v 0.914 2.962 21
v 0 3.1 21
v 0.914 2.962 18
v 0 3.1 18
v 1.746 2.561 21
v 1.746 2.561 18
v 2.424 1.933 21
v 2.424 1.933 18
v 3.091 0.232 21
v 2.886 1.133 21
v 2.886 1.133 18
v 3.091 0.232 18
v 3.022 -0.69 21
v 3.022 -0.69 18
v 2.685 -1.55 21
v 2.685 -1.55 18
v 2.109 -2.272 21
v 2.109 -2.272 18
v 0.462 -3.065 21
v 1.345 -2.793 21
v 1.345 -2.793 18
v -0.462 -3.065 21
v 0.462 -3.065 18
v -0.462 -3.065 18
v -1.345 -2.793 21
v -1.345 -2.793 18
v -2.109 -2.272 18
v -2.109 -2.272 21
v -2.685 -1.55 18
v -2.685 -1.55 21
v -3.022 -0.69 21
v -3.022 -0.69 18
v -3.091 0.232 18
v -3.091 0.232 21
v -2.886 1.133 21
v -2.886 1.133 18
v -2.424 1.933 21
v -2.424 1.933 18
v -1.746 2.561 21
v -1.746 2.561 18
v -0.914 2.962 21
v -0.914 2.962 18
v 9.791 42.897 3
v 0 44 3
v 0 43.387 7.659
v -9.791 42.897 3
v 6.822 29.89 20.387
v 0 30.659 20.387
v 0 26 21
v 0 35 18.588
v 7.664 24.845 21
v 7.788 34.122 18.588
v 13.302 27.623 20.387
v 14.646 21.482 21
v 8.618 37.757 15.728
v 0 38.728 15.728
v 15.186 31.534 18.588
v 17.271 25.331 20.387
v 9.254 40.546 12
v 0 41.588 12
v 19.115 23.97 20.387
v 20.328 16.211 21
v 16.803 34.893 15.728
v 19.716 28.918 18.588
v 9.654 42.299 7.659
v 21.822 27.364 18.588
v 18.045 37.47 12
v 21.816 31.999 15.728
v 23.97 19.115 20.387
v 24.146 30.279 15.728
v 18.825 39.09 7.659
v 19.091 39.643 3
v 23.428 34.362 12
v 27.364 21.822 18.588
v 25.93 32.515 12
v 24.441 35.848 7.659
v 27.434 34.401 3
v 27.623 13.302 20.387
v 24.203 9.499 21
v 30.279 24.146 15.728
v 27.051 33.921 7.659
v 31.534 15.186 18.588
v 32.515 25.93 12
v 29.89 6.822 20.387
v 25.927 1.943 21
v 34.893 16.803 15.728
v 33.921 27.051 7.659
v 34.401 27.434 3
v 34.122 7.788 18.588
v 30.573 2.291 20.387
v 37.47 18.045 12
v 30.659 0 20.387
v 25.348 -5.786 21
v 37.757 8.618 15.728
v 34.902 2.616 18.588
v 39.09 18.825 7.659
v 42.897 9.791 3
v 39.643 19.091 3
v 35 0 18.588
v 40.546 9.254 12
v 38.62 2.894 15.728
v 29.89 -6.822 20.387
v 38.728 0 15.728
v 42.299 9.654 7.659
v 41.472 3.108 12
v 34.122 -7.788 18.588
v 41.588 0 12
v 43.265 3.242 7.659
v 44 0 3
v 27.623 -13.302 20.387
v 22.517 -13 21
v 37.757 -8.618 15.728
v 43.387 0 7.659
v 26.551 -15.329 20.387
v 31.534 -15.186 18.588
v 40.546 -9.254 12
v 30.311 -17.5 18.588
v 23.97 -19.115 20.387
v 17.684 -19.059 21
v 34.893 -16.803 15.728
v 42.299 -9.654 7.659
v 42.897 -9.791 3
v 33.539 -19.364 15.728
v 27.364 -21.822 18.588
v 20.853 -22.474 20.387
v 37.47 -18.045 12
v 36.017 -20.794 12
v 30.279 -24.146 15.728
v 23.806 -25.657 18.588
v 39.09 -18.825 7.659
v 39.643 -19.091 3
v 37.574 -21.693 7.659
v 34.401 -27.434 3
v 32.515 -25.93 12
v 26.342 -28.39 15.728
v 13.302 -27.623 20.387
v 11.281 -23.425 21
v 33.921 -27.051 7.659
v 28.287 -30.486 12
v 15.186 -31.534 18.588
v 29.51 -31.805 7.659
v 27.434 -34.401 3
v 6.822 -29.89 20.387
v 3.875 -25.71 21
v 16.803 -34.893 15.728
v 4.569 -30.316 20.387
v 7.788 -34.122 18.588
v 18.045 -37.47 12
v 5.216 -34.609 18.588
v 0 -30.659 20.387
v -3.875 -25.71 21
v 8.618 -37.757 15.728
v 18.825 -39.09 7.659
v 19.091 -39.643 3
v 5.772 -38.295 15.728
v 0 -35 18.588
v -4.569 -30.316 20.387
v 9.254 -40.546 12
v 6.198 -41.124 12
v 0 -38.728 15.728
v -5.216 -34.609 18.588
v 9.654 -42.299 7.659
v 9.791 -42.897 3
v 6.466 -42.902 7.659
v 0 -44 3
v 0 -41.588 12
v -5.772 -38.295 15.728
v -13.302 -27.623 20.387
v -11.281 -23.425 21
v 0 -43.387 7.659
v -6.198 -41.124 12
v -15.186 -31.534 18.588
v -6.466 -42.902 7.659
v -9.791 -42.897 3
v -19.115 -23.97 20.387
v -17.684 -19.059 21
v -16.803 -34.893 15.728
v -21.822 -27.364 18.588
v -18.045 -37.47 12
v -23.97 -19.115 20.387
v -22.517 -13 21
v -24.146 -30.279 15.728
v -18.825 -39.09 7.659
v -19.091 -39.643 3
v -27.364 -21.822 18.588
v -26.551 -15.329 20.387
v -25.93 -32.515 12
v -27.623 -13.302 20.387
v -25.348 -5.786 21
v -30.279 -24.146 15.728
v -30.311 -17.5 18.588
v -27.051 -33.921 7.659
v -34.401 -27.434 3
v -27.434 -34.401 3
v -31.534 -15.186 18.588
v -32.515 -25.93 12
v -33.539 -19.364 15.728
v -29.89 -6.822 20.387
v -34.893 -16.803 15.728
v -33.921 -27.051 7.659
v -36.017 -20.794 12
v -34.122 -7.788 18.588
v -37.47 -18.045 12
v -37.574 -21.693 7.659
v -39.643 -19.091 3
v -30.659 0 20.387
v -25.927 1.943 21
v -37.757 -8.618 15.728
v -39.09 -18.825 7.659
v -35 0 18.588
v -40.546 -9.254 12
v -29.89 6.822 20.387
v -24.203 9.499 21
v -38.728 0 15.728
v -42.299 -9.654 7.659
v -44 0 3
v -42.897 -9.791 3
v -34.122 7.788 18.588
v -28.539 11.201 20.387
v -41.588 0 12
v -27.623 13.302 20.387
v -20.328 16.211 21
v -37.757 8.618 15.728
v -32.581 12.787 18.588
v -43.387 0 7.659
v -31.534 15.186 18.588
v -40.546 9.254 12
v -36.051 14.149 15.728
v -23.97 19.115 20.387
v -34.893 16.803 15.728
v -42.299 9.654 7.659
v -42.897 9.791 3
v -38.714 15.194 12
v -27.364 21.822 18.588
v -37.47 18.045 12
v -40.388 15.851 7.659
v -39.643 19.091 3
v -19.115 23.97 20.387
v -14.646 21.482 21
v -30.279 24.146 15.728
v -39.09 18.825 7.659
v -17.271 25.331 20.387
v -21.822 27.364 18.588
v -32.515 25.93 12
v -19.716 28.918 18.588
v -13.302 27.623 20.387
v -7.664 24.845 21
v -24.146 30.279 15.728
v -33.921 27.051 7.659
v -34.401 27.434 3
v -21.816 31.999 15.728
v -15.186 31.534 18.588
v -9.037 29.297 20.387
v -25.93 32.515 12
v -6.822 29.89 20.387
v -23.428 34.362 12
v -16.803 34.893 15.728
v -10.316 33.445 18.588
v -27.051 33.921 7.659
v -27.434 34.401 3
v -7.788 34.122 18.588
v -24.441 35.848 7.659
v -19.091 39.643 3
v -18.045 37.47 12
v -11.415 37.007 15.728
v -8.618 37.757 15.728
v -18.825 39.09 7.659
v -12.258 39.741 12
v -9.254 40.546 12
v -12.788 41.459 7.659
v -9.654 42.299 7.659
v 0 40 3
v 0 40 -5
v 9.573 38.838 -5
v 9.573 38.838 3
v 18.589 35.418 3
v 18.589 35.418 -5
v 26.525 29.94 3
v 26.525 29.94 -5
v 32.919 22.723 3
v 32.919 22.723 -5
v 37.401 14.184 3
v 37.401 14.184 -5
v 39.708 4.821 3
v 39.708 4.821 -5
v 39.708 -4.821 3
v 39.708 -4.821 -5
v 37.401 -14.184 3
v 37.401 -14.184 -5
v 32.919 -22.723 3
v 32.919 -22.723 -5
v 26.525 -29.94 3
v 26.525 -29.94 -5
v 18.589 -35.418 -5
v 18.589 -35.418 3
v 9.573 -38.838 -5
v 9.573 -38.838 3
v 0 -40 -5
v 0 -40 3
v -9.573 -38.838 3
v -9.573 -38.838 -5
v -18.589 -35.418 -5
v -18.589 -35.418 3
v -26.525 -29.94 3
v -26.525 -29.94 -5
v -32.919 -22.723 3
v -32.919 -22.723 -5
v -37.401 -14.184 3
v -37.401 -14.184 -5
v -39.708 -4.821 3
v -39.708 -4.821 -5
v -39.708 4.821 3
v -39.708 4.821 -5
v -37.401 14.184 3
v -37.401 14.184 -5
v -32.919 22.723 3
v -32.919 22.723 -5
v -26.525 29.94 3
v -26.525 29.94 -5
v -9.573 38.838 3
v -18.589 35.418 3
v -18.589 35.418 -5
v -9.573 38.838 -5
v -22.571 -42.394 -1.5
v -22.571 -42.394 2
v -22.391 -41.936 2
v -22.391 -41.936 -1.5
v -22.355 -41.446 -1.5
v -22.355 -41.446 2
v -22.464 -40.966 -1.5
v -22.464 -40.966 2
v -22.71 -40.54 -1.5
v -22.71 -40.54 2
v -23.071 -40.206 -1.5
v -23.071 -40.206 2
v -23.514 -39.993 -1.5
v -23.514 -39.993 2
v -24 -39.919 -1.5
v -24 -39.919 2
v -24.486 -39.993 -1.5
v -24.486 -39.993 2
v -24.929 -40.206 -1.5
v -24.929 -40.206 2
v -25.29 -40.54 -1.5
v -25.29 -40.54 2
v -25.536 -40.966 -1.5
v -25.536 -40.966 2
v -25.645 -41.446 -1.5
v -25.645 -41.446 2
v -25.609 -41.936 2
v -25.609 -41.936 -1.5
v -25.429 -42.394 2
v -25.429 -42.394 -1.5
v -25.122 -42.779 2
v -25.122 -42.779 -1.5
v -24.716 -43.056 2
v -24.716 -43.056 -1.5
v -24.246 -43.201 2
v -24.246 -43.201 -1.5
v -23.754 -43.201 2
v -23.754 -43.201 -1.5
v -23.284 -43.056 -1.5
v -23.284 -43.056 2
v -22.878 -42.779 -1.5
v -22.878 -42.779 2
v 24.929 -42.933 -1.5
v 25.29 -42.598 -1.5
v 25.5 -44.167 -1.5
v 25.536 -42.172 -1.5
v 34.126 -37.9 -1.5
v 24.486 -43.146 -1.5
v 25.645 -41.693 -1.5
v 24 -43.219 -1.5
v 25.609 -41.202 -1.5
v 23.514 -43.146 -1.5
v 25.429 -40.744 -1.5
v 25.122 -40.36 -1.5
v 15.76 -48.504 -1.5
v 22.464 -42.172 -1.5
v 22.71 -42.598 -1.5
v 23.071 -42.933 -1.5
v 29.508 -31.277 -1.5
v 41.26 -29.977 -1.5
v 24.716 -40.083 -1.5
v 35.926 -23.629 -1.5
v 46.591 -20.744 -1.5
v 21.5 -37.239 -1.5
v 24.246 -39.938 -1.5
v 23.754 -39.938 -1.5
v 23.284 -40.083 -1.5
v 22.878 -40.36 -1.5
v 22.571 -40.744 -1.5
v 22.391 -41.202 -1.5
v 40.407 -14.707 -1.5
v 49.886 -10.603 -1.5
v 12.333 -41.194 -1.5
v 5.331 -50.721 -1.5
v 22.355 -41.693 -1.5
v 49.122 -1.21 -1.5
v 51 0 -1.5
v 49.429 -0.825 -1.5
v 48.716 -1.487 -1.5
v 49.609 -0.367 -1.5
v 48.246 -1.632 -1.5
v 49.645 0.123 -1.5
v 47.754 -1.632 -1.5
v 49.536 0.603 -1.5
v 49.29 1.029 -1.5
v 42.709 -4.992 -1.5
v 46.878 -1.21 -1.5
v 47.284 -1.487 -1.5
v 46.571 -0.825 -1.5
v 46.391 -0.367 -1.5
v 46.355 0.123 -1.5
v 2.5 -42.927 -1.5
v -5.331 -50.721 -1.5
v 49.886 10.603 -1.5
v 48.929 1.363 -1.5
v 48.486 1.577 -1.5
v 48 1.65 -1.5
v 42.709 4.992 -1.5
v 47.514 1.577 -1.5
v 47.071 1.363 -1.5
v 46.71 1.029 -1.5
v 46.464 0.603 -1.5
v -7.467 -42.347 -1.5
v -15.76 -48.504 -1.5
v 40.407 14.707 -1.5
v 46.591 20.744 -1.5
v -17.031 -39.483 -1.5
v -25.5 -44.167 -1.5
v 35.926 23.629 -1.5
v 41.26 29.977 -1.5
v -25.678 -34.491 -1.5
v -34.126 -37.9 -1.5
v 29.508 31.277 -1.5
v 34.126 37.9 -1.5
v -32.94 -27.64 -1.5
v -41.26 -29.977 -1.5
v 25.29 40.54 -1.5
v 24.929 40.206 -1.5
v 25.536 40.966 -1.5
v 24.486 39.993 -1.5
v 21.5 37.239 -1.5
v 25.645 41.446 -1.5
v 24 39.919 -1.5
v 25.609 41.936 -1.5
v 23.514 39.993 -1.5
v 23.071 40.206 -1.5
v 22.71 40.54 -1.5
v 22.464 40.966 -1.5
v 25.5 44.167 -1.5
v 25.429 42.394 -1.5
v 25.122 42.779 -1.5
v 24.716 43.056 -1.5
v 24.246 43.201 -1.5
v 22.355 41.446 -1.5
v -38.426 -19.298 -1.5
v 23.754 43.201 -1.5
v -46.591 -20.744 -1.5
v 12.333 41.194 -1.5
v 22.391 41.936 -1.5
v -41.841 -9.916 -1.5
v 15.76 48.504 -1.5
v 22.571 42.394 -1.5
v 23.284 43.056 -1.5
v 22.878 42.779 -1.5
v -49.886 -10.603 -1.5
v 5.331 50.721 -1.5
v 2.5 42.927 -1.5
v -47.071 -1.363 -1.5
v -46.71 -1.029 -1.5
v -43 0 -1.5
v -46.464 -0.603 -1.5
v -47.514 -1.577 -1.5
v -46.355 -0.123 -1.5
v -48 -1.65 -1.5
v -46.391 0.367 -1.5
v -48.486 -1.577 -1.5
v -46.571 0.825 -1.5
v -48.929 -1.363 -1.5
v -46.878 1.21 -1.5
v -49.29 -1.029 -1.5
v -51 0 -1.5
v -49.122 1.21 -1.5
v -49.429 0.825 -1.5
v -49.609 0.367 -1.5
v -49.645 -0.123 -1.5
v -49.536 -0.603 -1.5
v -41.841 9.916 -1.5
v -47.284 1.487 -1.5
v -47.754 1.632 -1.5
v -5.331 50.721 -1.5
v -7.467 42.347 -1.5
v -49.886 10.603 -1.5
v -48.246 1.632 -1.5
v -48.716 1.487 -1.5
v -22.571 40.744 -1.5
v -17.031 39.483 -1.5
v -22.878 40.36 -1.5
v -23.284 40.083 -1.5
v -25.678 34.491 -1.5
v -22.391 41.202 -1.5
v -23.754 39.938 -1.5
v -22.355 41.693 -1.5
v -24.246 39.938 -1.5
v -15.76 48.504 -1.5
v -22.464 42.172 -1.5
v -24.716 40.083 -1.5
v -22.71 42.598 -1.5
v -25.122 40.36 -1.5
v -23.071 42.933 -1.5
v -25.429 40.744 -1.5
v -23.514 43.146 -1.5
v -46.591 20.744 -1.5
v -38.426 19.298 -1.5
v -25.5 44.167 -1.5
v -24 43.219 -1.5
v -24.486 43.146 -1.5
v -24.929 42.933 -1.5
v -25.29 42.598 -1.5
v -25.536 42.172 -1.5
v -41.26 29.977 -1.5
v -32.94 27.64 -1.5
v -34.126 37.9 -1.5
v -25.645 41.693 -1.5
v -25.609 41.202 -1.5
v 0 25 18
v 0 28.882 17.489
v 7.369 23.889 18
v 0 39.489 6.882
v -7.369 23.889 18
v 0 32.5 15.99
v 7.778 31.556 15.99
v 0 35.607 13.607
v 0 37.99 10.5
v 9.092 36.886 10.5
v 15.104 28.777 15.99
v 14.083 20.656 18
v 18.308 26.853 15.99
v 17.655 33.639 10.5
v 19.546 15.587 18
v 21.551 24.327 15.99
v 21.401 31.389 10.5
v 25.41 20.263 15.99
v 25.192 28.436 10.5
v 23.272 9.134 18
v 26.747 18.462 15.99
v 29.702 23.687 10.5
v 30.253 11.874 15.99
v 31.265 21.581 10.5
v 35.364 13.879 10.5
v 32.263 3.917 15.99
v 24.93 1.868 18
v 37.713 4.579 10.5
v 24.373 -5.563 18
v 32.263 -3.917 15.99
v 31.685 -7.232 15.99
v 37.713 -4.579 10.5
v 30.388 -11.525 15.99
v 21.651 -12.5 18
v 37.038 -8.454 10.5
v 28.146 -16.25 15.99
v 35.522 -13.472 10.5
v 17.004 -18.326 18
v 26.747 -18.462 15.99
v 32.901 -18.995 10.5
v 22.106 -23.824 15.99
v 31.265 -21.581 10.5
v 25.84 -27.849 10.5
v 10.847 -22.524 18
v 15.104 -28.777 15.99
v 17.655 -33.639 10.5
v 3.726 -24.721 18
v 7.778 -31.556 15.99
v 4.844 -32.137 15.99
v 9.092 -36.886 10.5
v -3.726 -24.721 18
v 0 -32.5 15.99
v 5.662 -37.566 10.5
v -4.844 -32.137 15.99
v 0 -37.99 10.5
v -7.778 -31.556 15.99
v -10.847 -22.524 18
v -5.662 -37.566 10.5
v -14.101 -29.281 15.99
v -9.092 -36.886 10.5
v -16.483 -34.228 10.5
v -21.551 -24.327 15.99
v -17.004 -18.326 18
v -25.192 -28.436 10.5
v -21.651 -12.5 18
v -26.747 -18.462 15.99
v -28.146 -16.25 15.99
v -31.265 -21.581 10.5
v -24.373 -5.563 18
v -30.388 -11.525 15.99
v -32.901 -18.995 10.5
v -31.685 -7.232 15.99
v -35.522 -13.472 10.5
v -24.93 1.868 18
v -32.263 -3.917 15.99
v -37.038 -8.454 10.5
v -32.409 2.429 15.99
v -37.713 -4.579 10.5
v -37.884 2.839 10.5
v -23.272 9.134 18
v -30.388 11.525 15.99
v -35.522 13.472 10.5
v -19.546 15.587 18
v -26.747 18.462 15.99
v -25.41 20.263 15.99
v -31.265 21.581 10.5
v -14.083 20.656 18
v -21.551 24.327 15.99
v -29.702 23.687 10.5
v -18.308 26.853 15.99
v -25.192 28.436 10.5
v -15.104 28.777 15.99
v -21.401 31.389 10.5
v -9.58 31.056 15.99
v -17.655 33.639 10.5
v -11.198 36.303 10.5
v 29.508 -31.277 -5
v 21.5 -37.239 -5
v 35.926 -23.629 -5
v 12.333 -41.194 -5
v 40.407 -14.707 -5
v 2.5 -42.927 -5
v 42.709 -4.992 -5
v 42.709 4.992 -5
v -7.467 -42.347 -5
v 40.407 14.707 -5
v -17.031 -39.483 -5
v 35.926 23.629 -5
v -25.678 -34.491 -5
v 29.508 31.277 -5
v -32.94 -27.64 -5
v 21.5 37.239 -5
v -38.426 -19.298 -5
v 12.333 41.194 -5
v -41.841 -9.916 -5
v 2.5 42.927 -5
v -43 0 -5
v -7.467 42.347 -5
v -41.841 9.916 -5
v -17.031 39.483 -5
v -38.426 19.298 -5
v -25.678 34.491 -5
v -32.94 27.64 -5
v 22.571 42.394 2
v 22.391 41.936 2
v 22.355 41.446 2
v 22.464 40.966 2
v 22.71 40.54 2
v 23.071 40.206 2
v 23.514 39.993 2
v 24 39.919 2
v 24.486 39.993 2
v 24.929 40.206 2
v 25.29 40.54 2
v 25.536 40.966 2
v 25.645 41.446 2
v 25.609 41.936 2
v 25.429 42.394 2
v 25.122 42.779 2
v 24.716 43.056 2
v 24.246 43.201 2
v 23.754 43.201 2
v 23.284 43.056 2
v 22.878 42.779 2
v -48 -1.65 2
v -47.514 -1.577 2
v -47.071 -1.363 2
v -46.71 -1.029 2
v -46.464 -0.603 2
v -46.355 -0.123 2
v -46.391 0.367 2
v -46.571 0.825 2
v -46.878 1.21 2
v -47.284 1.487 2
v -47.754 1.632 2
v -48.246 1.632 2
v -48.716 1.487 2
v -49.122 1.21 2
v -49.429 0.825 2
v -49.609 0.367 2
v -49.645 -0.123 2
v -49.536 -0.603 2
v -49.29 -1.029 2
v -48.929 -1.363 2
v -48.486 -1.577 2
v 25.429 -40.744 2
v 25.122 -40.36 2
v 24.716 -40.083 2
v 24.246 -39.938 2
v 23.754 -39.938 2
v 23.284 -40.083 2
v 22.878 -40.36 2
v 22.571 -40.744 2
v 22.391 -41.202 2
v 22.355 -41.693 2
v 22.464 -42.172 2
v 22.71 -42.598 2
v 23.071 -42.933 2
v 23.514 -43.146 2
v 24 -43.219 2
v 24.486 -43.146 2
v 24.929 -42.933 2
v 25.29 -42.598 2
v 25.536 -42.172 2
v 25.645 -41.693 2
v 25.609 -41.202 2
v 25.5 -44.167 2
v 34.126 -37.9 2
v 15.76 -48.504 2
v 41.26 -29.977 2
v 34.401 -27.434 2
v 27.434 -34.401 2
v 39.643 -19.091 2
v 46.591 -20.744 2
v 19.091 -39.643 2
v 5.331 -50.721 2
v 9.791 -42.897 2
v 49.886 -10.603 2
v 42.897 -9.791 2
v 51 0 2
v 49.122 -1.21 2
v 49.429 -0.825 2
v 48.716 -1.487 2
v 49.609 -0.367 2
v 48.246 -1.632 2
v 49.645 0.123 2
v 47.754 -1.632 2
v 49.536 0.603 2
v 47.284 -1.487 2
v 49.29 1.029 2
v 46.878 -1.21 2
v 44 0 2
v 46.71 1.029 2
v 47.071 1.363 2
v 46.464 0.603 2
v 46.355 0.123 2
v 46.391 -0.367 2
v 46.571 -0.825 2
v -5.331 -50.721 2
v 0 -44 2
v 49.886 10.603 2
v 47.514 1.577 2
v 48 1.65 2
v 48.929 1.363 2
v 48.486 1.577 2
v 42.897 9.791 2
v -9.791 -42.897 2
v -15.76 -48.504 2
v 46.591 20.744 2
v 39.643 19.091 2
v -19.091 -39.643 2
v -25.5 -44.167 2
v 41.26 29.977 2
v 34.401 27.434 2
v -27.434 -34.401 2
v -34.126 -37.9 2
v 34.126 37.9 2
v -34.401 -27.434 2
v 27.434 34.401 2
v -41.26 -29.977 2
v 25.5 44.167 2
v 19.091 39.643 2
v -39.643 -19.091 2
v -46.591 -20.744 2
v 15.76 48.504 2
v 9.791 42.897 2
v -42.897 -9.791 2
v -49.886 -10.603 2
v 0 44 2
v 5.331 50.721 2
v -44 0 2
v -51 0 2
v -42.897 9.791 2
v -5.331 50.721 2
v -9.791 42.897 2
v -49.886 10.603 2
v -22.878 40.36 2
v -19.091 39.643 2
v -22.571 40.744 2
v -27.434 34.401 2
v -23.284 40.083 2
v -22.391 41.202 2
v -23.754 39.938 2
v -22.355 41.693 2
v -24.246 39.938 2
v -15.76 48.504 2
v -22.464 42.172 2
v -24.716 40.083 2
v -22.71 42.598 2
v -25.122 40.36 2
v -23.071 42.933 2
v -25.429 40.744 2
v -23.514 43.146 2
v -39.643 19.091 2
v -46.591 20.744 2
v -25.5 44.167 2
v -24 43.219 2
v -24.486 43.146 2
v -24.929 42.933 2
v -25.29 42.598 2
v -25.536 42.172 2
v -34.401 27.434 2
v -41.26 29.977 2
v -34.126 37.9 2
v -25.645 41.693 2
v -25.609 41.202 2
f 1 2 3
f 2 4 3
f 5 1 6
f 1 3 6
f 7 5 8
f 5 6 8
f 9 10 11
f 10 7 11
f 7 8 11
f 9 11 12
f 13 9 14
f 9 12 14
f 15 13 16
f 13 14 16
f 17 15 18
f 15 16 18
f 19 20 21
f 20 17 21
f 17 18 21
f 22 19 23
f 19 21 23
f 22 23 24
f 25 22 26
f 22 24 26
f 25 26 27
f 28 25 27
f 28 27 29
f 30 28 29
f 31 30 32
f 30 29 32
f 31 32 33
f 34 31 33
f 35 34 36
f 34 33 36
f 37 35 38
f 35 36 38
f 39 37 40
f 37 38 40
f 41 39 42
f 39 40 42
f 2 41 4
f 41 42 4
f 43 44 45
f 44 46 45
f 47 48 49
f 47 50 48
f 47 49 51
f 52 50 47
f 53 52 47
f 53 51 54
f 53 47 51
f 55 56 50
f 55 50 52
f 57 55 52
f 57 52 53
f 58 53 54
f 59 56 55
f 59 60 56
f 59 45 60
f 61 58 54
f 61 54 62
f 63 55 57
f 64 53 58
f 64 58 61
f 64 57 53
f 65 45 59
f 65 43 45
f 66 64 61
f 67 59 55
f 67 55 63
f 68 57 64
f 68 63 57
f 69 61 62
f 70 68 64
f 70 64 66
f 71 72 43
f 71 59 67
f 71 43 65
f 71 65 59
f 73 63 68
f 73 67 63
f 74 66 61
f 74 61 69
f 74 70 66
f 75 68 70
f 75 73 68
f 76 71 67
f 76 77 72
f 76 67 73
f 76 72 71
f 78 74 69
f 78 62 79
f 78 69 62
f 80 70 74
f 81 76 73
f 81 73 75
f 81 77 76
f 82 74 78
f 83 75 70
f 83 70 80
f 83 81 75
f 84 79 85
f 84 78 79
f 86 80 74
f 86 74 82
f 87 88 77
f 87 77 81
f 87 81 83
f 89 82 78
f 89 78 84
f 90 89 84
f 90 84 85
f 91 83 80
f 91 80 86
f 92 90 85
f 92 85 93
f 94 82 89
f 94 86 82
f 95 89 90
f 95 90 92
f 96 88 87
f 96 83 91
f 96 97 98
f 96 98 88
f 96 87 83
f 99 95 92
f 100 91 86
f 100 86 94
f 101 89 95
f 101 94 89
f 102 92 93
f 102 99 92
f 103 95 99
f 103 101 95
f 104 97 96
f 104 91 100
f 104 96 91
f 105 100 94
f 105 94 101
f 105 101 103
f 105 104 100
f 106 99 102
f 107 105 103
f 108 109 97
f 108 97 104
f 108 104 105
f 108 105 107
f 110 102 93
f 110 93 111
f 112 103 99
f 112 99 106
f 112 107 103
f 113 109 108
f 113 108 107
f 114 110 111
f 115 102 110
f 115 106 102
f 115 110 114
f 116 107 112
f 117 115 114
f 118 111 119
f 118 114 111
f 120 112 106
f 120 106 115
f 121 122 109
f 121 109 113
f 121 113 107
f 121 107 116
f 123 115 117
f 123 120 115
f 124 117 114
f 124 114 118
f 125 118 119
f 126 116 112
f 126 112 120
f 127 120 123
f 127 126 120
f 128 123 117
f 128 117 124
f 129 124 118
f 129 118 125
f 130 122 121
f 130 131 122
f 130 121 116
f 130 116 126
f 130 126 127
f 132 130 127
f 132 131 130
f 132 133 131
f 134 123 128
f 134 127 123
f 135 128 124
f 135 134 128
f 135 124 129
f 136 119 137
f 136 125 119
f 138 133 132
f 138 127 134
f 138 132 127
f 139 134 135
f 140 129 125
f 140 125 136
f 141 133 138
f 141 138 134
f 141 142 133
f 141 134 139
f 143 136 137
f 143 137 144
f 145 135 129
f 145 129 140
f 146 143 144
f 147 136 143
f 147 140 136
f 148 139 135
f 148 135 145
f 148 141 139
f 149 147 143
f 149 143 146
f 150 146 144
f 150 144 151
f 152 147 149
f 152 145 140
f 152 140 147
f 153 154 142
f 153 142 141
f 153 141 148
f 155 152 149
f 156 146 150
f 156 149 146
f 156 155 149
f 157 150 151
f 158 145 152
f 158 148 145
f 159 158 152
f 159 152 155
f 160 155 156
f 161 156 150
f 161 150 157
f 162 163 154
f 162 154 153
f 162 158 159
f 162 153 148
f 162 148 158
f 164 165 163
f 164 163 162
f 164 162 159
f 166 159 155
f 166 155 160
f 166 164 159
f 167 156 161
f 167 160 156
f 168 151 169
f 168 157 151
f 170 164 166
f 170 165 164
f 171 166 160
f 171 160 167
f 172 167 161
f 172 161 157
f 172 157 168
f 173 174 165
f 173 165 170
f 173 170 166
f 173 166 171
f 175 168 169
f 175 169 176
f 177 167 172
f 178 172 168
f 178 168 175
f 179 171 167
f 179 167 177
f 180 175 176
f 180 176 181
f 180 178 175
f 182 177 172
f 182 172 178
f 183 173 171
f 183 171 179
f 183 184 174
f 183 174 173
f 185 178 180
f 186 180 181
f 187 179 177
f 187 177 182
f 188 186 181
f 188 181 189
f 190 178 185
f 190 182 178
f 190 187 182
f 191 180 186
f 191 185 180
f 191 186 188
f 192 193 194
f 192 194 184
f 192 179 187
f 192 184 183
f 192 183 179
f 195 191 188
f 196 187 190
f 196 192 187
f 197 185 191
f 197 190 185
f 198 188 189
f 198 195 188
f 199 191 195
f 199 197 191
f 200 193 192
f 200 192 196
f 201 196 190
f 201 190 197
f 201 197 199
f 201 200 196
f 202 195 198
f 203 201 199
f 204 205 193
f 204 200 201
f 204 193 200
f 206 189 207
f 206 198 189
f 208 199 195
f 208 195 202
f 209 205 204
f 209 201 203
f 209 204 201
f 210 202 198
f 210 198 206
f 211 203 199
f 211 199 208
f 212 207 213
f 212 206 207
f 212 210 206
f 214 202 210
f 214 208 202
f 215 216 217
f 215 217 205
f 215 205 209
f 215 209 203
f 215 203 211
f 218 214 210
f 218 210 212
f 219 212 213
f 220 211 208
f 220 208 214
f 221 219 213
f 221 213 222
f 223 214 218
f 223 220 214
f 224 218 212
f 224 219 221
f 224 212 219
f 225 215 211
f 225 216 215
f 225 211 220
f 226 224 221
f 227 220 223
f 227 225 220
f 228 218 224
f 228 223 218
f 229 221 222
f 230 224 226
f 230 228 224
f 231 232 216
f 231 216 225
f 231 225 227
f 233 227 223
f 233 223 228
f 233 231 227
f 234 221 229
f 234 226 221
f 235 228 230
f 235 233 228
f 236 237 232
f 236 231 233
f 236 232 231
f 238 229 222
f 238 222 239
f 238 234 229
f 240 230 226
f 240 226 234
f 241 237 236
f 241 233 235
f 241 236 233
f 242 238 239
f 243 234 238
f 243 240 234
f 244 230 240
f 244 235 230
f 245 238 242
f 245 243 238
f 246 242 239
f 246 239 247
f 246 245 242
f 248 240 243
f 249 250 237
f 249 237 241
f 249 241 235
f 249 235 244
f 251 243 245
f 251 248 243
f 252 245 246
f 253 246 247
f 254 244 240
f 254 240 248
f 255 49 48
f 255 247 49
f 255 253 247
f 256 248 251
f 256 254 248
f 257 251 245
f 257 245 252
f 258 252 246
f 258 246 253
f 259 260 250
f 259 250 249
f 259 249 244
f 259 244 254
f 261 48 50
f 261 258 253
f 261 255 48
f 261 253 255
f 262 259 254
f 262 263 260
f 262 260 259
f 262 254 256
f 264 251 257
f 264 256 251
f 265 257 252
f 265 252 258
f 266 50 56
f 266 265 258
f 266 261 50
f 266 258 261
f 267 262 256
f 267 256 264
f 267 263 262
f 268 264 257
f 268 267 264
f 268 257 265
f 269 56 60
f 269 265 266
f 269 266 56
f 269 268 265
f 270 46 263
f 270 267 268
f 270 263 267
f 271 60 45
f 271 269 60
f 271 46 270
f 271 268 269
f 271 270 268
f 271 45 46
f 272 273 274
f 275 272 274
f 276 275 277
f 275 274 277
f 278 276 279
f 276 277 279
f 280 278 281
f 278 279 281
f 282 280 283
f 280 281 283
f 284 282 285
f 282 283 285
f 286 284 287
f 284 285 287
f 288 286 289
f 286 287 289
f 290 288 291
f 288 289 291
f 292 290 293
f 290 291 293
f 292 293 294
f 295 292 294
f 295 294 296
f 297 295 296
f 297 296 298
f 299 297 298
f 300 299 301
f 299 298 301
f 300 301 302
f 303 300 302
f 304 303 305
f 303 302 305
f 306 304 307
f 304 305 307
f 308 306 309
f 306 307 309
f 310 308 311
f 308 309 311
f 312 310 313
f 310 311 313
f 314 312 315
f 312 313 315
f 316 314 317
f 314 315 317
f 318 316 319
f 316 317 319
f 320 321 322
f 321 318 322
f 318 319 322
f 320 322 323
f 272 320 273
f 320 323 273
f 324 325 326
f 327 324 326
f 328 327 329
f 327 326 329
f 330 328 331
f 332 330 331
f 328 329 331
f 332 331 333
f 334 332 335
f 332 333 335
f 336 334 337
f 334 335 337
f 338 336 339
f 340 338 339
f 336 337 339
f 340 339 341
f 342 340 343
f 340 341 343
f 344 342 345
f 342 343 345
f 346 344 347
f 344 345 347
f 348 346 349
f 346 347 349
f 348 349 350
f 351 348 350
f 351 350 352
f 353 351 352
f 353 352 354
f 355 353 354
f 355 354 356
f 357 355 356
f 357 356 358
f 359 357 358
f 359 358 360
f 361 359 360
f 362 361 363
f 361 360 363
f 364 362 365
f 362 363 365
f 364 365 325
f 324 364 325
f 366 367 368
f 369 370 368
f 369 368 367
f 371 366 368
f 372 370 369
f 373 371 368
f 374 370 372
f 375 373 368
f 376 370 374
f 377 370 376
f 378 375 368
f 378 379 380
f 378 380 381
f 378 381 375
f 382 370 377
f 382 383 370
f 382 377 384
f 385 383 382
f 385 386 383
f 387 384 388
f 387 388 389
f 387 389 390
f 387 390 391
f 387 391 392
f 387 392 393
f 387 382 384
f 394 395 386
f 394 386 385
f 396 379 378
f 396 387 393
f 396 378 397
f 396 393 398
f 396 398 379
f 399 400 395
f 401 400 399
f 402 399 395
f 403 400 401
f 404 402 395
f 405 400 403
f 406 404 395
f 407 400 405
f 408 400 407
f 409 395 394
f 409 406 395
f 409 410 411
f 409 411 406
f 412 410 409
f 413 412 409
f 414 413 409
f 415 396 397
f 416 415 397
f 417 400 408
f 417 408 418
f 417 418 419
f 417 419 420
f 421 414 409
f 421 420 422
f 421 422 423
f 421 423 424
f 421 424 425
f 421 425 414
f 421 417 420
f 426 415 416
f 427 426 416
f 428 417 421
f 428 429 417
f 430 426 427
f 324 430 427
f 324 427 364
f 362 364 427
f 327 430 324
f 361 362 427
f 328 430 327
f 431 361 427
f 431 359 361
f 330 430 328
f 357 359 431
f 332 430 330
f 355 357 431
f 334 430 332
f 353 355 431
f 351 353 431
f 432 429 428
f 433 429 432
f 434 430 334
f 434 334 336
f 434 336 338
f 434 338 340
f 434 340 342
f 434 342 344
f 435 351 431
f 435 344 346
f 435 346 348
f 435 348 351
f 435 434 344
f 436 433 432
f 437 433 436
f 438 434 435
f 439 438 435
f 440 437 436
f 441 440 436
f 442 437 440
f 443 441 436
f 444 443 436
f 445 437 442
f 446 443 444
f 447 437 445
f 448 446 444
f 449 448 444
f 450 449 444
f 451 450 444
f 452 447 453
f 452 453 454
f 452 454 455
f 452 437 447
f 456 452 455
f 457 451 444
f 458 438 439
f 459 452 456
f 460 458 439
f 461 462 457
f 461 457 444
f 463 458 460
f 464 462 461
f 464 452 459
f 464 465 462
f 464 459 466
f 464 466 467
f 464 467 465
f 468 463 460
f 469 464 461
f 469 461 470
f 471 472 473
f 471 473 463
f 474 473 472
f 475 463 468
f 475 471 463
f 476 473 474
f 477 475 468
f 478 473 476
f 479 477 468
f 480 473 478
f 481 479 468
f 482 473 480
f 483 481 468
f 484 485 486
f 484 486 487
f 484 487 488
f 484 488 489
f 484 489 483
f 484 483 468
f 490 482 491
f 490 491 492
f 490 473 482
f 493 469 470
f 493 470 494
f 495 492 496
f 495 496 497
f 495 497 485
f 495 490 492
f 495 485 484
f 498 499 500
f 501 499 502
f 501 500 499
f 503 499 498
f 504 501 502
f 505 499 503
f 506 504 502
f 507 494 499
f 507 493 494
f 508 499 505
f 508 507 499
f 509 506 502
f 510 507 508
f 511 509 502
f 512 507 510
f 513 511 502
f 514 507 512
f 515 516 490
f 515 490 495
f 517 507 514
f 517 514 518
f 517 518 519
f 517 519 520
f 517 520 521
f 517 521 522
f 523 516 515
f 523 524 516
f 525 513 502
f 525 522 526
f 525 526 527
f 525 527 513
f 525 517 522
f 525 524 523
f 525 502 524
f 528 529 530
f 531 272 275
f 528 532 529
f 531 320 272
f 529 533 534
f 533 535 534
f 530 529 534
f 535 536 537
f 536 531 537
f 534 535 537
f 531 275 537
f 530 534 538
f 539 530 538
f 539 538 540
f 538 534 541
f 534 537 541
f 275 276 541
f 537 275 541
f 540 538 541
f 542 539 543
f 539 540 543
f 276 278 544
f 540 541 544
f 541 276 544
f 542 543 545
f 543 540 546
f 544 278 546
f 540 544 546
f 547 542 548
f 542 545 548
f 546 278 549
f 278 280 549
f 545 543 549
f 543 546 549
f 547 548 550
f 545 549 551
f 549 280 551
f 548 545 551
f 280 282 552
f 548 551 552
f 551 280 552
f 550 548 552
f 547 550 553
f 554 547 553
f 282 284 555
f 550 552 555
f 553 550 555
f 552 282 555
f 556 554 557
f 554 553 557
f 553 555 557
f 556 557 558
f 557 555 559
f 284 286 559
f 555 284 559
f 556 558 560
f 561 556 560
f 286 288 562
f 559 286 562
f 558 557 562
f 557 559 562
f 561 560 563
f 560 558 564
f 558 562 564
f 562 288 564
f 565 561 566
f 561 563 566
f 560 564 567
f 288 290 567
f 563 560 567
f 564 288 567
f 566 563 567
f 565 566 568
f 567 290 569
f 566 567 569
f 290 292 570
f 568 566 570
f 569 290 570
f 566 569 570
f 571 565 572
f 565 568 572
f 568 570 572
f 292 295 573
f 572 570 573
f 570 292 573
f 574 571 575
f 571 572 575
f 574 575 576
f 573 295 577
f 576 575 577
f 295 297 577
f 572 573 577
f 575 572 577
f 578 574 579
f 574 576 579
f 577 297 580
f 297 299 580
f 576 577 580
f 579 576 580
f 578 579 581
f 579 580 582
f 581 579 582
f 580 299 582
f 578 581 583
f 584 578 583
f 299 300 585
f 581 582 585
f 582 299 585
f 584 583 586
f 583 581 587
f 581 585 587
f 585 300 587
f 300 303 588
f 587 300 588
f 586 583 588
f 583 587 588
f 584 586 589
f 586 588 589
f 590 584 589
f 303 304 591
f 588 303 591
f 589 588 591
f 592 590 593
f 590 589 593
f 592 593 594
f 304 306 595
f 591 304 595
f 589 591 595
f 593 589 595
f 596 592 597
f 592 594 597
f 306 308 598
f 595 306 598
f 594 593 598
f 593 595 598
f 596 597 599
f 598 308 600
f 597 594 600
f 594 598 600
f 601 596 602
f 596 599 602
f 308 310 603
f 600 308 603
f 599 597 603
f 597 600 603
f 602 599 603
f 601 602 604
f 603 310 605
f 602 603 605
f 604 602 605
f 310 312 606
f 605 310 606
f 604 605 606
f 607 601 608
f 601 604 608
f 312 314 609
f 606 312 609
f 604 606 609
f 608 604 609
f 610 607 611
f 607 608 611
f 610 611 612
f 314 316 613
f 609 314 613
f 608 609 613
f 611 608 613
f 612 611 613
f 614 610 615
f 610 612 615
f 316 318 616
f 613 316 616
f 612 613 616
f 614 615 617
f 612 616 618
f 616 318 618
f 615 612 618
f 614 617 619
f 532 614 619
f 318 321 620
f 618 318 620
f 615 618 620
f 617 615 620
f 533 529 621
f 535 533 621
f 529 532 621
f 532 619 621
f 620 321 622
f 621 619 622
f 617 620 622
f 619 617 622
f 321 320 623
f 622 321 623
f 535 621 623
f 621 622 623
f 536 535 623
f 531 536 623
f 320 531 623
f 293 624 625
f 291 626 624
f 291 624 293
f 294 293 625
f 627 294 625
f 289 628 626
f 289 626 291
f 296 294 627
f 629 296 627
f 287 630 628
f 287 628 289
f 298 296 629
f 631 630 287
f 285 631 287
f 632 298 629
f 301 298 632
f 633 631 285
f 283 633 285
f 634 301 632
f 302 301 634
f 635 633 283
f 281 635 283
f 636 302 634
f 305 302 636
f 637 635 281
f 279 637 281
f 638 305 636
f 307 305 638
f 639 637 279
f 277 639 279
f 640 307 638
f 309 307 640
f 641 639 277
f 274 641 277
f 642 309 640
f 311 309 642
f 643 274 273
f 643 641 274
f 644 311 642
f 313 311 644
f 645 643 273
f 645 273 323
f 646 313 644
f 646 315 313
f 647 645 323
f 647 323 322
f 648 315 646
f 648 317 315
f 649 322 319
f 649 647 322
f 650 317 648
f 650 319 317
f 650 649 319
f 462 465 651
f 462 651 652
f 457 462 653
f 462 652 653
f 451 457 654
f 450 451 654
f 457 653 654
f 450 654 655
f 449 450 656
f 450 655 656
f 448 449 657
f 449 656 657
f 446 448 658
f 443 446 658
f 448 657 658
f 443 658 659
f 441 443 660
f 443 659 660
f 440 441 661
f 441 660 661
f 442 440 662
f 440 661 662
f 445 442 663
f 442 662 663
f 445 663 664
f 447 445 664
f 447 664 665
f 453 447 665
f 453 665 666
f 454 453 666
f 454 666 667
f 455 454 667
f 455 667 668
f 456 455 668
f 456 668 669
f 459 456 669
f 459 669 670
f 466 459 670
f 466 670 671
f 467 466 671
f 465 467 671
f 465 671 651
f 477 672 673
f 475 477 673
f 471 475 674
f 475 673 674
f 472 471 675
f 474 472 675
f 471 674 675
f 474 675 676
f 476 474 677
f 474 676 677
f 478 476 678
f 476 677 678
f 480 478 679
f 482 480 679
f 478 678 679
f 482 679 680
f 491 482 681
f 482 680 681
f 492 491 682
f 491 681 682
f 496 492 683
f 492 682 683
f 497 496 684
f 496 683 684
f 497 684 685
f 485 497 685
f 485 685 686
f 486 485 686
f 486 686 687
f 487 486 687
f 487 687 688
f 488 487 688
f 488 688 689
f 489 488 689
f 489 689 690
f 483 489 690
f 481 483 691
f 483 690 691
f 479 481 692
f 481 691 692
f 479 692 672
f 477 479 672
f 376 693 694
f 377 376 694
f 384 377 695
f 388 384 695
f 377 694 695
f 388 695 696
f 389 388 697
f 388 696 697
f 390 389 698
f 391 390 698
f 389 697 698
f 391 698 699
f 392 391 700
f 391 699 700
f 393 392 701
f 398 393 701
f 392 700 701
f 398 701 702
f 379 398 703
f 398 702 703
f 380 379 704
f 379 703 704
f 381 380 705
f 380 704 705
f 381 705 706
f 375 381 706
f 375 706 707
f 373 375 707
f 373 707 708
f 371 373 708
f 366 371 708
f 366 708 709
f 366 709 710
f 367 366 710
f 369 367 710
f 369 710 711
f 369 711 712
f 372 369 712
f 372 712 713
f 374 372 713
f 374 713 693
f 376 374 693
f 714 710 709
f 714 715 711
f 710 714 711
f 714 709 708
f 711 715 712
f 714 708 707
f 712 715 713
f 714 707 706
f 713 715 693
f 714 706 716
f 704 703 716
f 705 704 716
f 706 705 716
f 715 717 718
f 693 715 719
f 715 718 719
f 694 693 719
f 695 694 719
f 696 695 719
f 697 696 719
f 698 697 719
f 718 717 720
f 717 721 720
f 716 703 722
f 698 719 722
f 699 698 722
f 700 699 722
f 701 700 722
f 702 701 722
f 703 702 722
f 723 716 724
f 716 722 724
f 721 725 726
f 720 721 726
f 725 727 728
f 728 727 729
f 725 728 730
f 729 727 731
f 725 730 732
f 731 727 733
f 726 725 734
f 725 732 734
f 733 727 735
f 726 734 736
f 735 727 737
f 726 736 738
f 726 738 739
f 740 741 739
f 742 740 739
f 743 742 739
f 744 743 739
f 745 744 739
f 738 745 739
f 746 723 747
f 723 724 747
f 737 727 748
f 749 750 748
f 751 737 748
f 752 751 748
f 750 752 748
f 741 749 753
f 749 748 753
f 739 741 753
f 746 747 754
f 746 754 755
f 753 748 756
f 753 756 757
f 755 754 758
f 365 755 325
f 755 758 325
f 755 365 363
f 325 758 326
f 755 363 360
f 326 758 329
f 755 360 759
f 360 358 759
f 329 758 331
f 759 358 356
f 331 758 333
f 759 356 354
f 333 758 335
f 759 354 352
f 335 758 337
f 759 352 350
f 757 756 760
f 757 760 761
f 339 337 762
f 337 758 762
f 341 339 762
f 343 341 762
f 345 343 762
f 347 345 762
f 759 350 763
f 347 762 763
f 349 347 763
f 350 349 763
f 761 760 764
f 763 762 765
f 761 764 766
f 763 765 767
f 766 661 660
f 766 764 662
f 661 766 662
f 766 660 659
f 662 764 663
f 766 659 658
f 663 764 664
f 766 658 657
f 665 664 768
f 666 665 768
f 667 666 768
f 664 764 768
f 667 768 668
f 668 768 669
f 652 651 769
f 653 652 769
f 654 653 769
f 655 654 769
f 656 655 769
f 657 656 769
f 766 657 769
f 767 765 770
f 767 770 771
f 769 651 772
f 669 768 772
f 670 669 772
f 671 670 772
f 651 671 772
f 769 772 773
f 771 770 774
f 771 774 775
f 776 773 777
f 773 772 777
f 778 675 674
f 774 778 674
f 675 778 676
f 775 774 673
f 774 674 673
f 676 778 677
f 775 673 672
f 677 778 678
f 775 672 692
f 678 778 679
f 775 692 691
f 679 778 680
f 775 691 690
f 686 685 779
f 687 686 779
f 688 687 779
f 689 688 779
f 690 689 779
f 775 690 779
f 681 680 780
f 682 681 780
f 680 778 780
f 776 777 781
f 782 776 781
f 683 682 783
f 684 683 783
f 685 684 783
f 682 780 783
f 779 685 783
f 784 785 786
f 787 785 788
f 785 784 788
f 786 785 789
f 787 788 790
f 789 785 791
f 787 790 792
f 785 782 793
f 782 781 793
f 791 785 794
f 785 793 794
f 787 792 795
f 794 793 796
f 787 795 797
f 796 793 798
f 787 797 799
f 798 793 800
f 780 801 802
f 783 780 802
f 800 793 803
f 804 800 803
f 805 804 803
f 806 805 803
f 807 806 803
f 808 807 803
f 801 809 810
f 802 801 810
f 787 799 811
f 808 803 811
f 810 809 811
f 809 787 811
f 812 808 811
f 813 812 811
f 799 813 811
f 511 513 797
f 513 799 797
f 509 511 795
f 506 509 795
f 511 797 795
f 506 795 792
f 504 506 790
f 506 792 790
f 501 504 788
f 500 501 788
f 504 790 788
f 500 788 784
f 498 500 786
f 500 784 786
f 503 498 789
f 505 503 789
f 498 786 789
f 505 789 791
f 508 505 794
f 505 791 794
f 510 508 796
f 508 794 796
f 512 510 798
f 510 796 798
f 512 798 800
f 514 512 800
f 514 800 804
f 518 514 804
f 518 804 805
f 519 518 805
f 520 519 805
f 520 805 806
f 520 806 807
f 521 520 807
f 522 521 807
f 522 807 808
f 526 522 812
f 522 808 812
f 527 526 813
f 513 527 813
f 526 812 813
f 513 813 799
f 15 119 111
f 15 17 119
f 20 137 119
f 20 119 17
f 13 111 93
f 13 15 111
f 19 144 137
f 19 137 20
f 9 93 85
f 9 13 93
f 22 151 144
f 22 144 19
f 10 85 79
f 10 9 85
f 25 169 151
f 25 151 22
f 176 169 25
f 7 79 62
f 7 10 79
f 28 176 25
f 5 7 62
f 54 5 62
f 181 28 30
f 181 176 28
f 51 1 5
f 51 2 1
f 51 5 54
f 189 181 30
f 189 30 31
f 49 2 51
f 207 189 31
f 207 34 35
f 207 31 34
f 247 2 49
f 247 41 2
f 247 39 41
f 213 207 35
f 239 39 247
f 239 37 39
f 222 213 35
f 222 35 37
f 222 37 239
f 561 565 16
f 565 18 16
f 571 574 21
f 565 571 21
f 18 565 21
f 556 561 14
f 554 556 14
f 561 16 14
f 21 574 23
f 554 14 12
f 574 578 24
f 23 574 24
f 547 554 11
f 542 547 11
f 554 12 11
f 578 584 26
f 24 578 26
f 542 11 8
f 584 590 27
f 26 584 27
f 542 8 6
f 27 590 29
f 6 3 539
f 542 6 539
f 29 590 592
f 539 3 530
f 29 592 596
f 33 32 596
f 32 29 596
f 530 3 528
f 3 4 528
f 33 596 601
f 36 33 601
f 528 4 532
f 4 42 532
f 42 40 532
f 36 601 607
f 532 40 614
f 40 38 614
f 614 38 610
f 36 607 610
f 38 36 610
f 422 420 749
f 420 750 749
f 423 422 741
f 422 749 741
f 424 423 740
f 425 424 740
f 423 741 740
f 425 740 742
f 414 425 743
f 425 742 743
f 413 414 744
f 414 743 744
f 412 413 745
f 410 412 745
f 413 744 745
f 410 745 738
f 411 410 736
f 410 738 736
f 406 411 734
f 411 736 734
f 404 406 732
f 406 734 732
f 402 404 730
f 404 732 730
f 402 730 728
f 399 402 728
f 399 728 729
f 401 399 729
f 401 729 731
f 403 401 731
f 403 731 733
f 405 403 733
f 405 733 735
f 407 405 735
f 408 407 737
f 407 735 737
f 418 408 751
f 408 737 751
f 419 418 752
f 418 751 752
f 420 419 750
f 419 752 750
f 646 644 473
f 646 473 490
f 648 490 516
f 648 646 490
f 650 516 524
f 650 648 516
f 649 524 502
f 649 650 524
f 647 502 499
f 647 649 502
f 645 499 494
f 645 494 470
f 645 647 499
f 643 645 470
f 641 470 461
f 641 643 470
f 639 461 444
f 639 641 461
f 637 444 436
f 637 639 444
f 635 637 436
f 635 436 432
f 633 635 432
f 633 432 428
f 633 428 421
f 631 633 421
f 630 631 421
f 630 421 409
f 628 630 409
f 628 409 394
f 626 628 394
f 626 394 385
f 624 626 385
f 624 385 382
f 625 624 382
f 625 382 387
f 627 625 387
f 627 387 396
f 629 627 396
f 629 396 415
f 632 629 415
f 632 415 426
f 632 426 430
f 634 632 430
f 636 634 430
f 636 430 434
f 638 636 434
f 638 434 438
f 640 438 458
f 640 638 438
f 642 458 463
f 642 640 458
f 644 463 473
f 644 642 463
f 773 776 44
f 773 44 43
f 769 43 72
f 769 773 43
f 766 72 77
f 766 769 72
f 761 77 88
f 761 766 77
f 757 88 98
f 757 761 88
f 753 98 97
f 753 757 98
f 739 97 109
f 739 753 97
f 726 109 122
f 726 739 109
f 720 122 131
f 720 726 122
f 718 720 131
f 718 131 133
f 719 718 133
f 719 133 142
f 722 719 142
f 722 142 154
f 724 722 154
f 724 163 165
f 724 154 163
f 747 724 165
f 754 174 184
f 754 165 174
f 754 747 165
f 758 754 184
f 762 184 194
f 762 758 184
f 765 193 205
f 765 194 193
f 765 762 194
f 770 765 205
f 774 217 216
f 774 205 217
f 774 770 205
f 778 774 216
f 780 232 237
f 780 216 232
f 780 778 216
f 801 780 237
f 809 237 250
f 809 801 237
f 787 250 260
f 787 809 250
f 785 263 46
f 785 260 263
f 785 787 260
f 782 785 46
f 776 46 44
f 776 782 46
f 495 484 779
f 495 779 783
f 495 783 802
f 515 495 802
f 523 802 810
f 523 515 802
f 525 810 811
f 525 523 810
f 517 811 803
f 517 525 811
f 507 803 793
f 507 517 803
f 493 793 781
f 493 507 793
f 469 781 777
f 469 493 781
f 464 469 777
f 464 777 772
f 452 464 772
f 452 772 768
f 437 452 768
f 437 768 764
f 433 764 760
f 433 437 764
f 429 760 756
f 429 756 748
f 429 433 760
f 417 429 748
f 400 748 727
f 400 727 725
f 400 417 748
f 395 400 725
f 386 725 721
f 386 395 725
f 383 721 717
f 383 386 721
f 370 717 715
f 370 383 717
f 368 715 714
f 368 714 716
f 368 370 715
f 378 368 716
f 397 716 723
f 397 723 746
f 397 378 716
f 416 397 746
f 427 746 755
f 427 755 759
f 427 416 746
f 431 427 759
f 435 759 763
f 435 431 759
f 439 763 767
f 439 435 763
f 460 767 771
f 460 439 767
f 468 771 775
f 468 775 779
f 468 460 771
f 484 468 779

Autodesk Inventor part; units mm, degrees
ref_plane "YZ Plane" through (0, 0, 0) normal (1, 0, 0) x (0, 1, 0)
ref_plane "XZ Plane" through (0, 0, 0) normal (0, 1, 0) x (-1, 0, 0)
sketch "Skizze1" plane through (0, 0, 0) normal (1, 0, 0) x (0, 1, 0)
  line L0 (0, 0) -> (0, 55)
  line L1 (44, 0) -> (0, 0) construction
  line L2 (3.1, 21) -> (3.1, 18)
  line L3 (44, 0) -> (40, 0)
  line L4 (40, 0) -> (40, -5)
  line L5 (40, -5) -> (44, -5)
  line L6 (44, -5) -> (44, 0)
  line L7 (3.1, 18) -> (40, 18)
  line L8 (40, 18) -> (40, 0)
  line L9 (3.1, 21) -> (44, 21)
  line L10 (44, 21) -> (44, 0)
  point P0 (21.7075, 15.1998)
  dimension "d143" = 6.2
  dimension "d146" = 18
  dimension "d147" = 3
  dimension "d155" = 5
  dimension "d156" = 4
  dimension "d186" = 80
revolve "Umdrehung4" add sketch "Skizze1" angle 360 about axis through (0, 0, 0) along (0, 0, 1)
sketch "Skizze28" plane through (0, 0, -5) normal (0, 0, -1) x (-1, 0, 0)
  circle A0 centre (0, 0) radius 44 projected
  circle A1 centre (0, 0) radius 40 projected
  circle A2 centre (0, 0) radius 51
  dimension "d157" = 102
extrude "Extrusion10" add sketch "Skizze28" against normal blind 7 contours A0 | A2
sketch "Skizze29" plane through (0, 0, -5) normal (0, 0, -1) x (-1, 0, 0)
  circle A0 centre (0, 0) radius 51 projected
  circle A1 centre (0, 0) radius 43
  dimension "d160" = 86
extrude "Extrusion11" cut sketch "Skizze29" against normal blind 3.5
sketch "Skizze30" plane through (0, 0, -1.5) normal (0, 0, -1) x (-1, 0, 0)
  circle A0 centre (0, 0) radius 43 projected
  circle A1 centre (0, 0) radius 51 projected
  point P0 (-48, 0)
  dimension "d163" = 48
hole "Bohrung3" at (48, 0, -1.5) direction (0, 0, 1) diameter 3.3 end through all
pattern_circular "Runde Anordnung2" count 6 over 360 about axis through (0, 0, -5) along (0, 0, 1) of "Bohrung3"
ref_plane "Arbeitsebene10" through (0, 0, 19) normal (0, 0, 1) x (1, 0, 0)
fillet "Rundung1" radius 15 1 edges at (0, -40, 18)
fillet "Rundung2" radius 18 1 edges at (0, -44, 21)
properties part number "Kugel_oben_V5_Riza" material "ABS-Kunststoff"
